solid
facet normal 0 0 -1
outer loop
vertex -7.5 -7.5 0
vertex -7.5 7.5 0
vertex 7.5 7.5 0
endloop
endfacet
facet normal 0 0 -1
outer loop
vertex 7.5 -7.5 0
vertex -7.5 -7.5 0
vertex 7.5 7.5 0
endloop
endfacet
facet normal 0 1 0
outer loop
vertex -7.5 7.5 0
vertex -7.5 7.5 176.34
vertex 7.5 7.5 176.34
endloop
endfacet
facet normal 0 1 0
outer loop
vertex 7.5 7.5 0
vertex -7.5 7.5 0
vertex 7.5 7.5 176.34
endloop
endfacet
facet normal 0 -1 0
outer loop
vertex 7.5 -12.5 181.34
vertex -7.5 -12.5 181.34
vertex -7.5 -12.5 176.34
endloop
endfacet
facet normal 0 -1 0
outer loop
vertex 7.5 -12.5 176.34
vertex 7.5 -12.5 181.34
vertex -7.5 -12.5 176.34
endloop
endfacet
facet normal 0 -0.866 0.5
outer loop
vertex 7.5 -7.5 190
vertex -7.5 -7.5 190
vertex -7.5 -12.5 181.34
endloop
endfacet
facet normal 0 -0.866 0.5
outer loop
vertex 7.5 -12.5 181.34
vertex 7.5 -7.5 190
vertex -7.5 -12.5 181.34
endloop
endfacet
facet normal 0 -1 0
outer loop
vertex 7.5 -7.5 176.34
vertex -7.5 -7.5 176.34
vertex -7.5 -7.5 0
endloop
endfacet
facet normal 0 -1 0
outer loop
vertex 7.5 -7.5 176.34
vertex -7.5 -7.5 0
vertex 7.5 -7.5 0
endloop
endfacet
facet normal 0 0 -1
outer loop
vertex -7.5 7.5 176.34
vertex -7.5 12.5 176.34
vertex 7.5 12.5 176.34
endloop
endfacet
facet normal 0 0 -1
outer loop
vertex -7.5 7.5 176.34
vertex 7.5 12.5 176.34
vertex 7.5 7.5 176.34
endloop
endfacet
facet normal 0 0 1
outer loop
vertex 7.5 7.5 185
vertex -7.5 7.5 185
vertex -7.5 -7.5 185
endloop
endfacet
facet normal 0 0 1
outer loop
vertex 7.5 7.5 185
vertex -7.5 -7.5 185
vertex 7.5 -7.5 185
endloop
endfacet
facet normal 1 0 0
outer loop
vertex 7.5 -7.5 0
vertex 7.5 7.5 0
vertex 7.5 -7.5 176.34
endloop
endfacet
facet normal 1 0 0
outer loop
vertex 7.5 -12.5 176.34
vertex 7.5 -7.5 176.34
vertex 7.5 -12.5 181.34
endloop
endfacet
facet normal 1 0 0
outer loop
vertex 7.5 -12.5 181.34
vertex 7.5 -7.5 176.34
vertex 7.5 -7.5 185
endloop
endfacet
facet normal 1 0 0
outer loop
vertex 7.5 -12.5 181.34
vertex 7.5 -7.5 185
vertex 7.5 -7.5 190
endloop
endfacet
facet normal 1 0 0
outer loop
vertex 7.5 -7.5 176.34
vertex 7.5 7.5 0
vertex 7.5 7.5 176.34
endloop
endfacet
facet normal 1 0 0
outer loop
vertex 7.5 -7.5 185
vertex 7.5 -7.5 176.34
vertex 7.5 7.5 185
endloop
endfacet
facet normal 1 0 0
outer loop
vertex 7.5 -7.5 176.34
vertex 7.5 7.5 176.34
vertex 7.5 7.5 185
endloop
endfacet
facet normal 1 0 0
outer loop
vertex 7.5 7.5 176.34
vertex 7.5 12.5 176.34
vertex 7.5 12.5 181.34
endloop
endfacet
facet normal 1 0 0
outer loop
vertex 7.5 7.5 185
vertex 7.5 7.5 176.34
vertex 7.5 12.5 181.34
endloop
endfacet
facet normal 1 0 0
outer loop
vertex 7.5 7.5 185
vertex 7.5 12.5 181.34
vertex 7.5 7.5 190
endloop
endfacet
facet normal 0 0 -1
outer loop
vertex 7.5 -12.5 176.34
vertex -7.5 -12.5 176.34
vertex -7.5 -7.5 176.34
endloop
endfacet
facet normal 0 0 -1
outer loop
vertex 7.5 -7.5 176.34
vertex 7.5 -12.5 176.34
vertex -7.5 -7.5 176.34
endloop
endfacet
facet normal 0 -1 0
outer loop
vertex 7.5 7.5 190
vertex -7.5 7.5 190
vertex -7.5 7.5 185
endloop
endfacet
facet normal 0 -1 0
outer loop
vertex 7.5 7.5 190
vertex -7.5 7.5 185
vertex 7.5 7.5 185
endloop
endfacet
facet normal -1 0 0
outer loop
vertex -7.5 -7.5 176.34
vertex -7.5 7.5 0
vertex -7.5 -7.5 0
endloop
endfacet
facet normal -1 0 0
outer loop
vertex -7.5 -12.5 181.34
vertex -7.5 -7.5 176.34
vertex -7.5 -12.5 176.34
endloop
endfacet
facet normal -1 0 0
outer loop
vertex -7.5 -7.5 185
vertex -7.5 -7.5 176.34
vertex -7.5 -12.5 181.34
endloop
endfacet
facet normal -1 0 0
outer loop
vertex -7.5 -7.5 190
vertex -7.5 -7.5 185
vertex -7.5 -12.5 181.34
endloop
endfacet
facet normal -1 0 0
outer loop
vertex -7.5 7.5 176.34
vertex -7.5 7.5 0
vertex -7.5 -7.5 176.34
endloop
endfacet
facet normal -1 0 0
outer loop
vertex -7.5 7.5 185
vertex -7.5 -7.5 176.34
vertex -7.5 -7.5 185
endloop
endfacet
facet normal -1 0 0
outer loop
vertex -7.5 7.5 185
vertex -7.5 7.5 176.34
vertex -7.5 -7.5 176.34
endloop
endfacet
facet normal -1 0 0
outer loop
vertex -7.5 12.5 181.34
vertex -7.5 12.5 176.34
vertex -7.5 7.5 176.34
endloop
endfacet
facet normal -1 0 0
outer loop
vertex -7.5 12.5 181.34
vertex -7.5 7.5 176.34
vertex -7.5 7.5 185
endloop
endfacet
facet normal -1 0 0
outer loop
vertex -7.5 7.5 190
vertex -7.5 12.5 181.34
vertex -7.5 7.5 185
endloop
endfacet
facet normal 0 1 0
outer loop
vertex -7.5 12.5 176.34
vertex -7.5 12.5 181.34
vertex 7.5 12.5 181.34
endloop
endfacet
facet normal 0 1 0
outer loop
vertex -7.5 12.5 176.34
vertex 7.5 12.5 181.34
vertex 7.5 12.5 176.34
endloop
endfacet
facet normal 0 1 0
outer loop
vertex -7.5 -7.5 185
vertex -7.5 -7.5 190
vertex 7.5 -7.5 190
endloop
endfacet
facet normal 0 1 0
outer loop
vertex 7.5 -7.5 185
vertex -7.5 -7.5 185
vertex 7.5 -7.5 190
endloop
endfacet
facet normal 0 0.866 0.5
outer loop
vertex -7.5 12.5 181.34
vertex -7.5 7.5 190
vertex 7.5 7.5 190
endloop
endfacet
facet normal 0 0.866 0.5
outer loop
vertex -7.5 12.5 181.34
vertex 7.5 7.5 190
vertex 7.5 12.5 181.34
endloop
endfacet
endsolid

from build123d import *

# Parameters (mm, degrees)
SKETCH1_W           = 15
SKETCH1_H           = 15
BOSS_EXTRUDE1_DEPTH = 190
BOSS_EXTRUDE2_DEPTH = 15
SKETCH3_W           = 15
SKETCH3_H           = 15
CUT_EXTRUDE1_DEPTH  = 5


with BuildPart() as part:
    # Sketch1 → Boss-Extrude1 (new body)
    with BuildSketch(Plane.XY):
        Rectangle(SKETCH1_W, SKETCH1_H)
    extrude(amount=BOSS_EXTRUDE1_DEPTH)

    # Sketch2 → Boss-Extrude2 (add)
    with BuildSketch(Plane.ZY.offset(7.5)):
        Polygon((190, 7.5), (181.339745962, 12.5), (176.339745962, 12.5), (176.339745962, 7.5), align=None)
        Polygon((176.339745962, -12.5), (176.339745962, -7.5), (190, -7.5), (181.339745962, -12.5), align=None)
    extrude(amount=-BOSS_EXTRUDE2_DEPTH)

    # Sketch3 → Cut-Extrude1 (cut)
    with BuildSketch(Plane.XY.offset(190)):
        Rectangle(SKETCH3_W, SKETCH3_H)
    extrude(amount=-CUT_EXTRUDE1_DEPTH, mode=Mode.SUBTRACT)


solid = part.part
